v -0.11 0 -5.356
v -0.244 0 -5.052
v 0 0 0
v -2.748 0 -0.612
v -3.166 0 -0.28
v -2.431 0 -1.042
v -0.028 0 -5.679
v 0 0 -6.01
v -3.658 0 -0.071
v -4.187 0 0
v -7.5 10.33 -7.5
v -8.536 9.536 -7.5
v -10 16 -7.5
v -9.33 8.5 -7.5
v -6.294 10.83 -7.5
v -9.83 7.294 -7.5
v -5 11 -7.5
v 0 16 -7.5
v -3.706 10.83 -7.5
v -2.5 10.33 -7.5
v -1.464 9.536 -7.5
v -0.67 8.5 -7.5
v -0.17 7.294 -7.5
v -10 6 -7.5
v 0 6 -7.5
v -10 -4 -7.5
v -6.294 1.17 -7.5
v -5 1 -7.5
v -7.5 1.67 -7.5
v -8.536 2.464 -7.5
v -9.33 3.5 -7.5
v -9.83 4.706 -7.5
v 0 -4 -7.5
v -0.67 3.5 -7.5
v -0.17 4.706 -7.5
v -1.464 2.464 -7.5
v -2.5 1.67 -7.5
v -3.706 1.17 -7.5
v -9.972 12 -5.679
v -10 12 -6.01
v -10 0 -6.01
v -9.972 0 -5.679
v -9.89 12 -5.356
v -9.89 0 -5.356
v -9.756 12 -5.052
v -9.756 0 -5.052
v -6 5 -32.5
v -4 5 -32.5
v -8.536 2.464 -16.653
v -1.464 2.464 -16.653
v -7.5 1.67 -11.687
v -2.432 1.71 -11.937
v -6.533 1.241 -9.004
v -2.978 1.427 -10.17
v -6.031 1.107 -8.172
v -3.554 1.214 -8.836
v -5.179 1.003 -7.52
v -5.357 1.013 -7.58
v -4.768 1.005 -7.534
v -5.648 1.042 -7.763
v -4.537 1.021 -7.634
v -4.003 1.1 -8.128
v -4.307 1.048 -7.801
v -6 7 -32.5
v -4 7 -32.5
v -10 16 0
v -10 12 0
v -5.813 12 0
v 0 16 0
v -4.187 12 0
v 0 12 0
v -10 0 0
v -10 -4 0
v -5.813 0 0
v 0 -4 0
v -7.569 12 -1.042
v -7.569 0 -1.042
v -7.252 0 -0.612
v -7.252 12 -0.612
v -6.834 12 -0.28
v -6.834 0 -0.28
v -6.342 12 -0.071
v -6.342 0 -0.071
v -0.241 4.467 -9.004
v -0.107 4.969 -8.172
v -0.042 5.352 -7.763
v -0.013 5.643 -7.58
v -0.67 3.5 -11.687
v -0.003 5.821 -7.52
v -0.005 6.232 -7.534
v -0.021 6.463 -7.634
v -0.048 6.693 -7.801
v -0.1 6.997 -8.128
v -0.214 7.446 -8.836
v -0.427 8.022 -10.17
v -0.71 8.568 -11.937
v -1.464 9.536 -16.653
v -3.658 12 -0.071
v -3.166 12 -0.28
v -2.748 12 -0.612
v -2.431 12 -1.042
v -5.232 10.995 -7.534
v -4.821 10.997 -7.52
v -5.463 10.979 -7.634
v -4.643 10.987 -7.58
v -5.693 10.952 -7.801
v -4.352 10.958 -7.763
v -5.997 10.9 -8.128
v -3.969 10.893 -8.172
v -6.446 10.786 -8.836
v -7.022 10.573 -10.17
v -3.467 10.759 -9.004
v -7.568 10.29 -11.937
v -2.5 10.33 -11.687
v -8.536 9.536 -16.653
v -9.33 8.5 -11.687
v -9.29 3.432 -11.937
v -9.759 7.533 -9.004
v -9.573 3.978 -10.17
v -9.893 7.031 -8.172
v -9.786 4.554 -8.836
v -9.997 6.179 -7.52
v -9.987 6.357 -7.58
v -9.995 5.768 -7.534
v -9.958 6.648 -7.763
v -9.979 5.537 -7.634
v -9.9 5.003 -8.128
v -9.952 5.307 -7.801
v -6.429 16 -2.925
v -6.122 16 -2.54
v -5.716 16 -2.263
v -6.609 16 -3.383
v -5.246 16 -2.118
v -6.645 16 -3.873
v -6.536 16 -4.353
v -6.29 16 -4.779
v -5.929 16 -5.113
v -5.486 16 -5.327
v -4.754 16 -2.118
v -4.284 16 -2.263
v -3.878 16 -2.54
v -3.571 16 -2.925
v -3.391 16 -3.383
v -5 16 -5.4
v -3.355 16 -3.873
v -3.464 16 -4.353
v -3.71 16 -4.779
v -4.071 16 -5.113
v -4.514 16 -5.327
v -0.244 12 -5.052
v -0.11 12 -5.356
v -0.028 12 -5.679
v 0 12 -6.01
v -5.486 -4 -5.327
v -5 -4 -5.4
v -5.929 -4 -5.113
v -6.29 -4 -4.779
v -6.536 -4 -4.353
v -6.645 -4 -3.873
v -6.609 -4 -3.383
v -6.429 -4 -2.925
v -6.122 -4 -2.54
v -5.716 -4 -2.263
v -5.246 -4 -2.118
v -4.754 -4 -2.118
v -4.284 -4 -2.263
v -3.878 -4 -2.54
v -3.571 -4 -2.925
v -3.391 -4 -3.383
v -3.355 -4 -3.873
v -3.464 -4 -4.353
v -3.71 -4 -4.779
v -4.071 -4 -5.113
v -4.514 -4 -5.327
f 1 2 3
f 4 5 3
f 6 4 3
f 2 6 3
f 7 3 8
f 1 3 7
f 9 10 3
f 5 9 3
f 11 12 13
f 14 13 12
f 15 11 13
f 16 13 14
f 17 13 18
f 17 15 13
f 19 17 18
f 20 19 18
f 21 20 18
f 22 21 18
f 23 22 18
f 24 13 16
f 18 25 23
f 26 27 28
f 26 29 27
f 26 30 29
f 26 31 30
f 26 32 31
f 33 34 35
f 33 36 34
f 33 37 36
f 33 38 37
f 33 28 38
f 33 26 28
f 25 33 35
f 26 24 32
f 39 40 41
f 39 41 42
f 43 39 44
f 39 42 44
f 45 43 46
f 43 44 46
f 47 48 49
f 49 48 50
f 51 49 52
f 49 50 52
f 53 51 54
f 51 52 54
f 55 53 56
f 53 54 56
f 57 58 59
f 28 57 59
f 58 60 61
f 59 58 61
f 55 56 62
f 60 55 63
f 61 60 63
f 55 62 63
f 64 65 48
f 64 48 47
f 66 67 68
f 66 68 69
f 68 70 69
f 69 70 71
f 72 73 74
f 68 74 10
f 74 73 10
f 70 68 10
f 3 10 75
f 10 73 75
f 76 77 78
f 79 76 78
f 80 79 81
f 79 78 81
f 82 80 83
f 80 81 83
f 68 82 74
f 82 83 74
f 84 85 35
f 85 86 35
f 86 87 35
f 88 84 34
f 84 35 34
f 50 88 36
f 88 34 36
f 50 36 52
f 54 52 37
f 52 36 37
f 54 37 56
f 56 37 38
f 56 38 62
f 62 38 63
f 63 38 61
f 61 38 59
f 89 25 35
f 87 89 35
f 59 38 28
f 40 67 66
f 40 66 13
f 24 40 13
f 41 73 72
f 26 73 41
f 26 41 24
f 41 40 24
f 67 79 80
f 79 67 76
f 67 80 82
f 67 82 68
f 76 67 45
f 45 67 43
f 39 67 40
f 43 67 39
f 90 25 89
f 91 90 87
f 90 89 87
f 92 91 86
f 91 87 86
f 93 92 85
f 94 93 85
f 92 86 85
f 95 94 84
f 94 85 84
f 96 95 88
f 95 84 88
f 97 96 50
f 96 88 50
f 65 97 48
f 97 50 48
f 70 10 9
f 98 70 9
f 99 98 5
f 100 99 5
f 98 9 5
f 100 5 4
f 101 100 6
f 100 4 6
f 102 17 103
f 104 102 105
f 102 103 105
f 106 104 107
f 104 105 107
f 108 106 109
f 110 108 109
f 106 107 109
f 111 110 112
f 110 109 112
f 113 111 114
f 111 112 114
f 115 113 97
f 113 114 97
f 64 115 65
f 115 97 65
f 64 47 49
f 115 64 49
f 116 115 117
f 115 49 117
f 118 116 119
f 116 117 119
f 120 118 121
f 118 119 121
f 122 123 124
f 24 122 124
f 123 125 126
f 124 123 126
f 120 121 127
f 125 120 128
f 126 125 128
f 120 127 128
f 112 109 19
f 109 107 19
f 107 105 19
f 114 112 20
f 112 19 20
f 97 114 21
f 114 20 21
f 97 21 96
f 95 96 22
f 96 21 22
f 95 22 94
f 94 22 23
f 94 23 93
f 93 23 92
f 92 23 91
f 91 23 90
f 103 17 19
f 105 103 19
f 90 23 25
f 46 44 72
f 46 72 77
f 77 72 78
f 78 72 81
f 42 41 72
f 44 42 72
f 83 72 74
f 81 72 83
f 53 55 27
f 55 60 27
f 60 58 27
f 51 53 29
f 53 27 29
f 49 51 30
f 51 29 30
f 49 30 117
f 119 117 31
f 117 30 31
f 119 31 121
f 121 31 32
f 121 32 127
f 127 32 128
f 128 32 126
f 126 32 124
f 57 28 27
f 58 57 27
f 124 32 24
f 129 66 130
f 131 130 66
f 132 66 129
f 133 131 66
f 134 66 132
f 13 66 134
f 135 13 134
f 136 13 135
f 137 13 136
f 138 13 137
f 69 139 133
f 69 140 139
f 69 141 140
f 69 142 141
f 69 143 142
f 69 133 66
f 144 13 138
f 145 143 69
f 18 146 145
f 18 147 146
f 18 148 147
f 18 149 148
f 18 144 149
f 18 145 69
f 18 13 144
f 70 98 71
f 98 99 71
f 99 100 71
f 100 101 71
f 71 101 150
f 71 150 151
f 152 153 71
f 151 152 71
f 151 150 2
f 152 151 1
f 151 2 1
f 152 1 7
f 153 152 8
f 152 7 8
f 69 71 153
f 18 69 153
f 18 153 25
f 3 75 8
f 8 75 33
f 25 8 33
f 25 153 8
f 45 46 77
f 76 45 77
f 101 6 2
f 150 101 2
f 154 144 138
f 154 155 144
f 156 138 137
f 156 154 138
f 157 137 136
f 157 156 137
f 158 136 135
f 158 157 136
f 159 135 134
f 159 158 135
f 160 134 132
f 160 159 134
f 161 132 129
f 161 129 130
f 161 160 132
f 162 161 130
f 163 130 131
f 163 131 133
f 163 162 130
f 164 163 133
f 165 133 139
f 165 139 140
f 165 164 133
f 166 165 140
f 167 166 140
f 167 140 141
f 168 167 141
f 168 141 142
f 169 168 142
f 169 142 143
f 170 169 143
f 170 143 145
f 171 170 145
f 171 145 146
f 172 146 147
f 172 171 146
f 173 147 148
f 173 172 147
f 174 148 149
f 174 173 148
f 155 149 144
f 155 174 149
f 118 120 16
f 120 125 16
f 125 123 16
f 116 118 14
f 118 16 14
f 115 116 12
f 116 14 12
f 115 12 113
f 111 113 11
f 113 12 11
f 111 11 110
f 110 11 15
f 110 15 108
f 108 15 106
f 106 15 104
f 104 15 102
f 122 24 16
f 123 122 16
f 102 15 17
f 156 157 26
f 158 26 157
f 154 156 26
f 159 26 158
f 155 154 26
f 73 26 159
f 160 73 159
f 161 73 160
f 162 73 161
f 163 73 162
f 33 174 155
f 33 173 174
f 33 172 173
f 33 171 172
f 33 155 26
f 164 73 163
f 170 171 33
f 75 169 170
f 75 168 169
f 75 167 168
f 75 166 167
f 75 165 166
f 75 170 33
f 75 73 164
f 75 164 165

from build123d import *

# Parameters (mm, degrees)
BOSS_EXTRUDE1_DEPTH = 12
BOSS_EXTRUDE2_START = 4
SKETCH2_W           = 10
SKETCH2_H           = 7.500000000000002
SKETCH2_R           = 1.65
BOSS_EXTRUDE2_DEPTH = 4
SKETCH3_W           = 10
SKETCH3_H           = 7.499999999999999
SKETCH3_R           = 1.6500000000000001
BOSS_EXTRUDE3_DEPTH = 4
SKETCH4_R           = 5.000000000000002
BOSS_EXTRUDE4_DEPTH = 25
CUT_EXTRUDE1_DEPTH  = 38.579914848227105
CUT_EXTRUDE2_DEPTH  = 40.44933459514875


with BuildPart() as part:
    # Sketch1 → Boss-Extrude1 (new body)
    with BuildSketch(Plane(origin=(0, 0, 0), x_dir=(1, 0, 0), z_dir=(0, 1, 0))):
        with BuildLine():
            Line((-5, 7.5), (-10, 7.499999999999999))
            Line((-10, 7.499999999999999), (-10, 6.009988028713897))
            ThreePointArc((-10, 6.009988028713897), (-9.937986363684939, 5.515813106068849), (-9.755791145828766, 5.052283767352735))
            Line((-9.755791145828766, 5.052283767352735), (-7.56852494834847, 1.0422957386388614))
            ThreePointArc((-7.56852494834847, 1.042295738638861), (-6.83366266323373, 0.2802022614966764), (-5.812733802519688, -8.9e-16))
            Line((-5.812733802519688, 0), (-5, 0))
            Line((-5, 0), (-5, 2.0999999999999996))
            ThreePointArc((-5.000000000000002, 2.0999999999999996), (-6.65, 3.7500000000000004), (-5, 5.3999999999999995))
            Line((-5, 5.3999999999999995), (-5, 7.5))
        make_face()
        with BuildLine():
            Line((0, 7.5), (-5, 7.5))
            Line((-5, 7.5), (-5, 5.3999999999999995))
            ThreePointArc((-5, 5.3999999999999995), (-3.8332738110421967, 4.916726188957803), (-3.35, 3.7499999999999996))
            ThreePointArc((-3.35, 3.749999999999999), (-3.833273811042198, 2.583273811042195), (-5.000000000000002, 2.0999999999999996))
            Line((-5, 2.0999999999999996), (-5, 0))
            Line((-5, 0), (-4.187266197480313, 0))
            ThreePointArc((-4.187266197480313, -8.9e-16), (-3.1663373367662704, 0.2802022614966755), (-2.4314750516515296, 1.0422957386388605))
            Line((-2.43147505165153, 1.0422957386388614), (-0.24420885417123472, 5.052283767352735))
            ThreePointArc((-0.24420885417123483, 5.052283767352735), (-0.06201363631506229, 5.515813106068849), (0, 6.009988028713897))
            Line((0, 6.009988028713897), (0, 7.5))
        make_face()
    extrude(amount=BOSS_EXTRUDE1_DEPTH)

    # Sketch2 → Boss-Extrude2 (add)
    with BuildSketch(Plane.XZ.offset(BOSS_EXTRUDE2_START)):
        with Locations((-5, -3.75)):
            Rectangle(SKETCH2_W, SKETCH2_H)
        with Locations(Location((-4.999999999999999, -3.75, 0), (0, 0, 270))):
            Circle(SKETCH2_R, mode=Mode.SUBTRACT)
    extrude(amount=-BOSS_EXTRUDE2_DEPTH)

    # Sketch3 → Boss-Extrude3 (add)
    with BuildSketch(Plane(origin=(0, 12, 0), x_dir=(1, 0, 0), z_dir=(0, 1, 0))):
        with Locations((-5, 3.7499999999999996)):
            Rectangle(SKETCH3_W, SKETCH3_H)
        with Locations(Location((-4.999999999999999, 3.7499999999999982, 0), (0, 0, 90))):
            Circle(SKETCH3_R, mode=Mode.SUBTRACT)
    extrude(amount=BOSS_EXTRUDE3_DEPTH)

    # Sketch4 → Boss-Extrude4 (add)
    with BuildSketch(Plane(origin=(-6.5e-16, 0, -7.5), x_dir=(-1, 0, 9e-17), z_dir=(-9e-17, 0, -1))):
        with Locations((5, 6)):
            Circle(SKETCH4_R)
    extrude(amount=BOSS_EXTRUDE4_DEPTH)

    # Sketch5 → Cut-Extrude1 (cut, through all)
    with BuildSketch(Plane(origin=(0, 0, 0), x_dir=(0, 0, -1), z_dir=(1, 0, 0))):
        Polygon((32.5, 11.000000000000002), (7.5, 11), (32.5, 7), align=None)
        Polygon((32.5, 0.9999999999999991), (32.5, 5), (7.5, 0.9999999999999991), align=None)
    extrude(amount=-CUT_EXTRUDE1_DEPTH, mode=Mode.SUBTRACT)

    # Sketch6 → Cut-Extrude2 (cut, through all)
    with BuildSketch(Plane(origin=(0, -4, 0), x_dir=(-1, 0, 0), z_dir=(0, -1, 0))):
        Polygon((3.47e-15, 7.5), (4.000000000000004, 32.50000000000002), (3.92e-15, 32.500000000000014), align=None)
        Polygon((10.000000000000009, 32.500000000000014), (6.000000000000004, 32.500000000000014), (10, 7.5), align=None)
    extrude(amount=-CUT_EXTRUDE2_DEPTH, mode=Mode.SUBTRACT)


solid = part.part
